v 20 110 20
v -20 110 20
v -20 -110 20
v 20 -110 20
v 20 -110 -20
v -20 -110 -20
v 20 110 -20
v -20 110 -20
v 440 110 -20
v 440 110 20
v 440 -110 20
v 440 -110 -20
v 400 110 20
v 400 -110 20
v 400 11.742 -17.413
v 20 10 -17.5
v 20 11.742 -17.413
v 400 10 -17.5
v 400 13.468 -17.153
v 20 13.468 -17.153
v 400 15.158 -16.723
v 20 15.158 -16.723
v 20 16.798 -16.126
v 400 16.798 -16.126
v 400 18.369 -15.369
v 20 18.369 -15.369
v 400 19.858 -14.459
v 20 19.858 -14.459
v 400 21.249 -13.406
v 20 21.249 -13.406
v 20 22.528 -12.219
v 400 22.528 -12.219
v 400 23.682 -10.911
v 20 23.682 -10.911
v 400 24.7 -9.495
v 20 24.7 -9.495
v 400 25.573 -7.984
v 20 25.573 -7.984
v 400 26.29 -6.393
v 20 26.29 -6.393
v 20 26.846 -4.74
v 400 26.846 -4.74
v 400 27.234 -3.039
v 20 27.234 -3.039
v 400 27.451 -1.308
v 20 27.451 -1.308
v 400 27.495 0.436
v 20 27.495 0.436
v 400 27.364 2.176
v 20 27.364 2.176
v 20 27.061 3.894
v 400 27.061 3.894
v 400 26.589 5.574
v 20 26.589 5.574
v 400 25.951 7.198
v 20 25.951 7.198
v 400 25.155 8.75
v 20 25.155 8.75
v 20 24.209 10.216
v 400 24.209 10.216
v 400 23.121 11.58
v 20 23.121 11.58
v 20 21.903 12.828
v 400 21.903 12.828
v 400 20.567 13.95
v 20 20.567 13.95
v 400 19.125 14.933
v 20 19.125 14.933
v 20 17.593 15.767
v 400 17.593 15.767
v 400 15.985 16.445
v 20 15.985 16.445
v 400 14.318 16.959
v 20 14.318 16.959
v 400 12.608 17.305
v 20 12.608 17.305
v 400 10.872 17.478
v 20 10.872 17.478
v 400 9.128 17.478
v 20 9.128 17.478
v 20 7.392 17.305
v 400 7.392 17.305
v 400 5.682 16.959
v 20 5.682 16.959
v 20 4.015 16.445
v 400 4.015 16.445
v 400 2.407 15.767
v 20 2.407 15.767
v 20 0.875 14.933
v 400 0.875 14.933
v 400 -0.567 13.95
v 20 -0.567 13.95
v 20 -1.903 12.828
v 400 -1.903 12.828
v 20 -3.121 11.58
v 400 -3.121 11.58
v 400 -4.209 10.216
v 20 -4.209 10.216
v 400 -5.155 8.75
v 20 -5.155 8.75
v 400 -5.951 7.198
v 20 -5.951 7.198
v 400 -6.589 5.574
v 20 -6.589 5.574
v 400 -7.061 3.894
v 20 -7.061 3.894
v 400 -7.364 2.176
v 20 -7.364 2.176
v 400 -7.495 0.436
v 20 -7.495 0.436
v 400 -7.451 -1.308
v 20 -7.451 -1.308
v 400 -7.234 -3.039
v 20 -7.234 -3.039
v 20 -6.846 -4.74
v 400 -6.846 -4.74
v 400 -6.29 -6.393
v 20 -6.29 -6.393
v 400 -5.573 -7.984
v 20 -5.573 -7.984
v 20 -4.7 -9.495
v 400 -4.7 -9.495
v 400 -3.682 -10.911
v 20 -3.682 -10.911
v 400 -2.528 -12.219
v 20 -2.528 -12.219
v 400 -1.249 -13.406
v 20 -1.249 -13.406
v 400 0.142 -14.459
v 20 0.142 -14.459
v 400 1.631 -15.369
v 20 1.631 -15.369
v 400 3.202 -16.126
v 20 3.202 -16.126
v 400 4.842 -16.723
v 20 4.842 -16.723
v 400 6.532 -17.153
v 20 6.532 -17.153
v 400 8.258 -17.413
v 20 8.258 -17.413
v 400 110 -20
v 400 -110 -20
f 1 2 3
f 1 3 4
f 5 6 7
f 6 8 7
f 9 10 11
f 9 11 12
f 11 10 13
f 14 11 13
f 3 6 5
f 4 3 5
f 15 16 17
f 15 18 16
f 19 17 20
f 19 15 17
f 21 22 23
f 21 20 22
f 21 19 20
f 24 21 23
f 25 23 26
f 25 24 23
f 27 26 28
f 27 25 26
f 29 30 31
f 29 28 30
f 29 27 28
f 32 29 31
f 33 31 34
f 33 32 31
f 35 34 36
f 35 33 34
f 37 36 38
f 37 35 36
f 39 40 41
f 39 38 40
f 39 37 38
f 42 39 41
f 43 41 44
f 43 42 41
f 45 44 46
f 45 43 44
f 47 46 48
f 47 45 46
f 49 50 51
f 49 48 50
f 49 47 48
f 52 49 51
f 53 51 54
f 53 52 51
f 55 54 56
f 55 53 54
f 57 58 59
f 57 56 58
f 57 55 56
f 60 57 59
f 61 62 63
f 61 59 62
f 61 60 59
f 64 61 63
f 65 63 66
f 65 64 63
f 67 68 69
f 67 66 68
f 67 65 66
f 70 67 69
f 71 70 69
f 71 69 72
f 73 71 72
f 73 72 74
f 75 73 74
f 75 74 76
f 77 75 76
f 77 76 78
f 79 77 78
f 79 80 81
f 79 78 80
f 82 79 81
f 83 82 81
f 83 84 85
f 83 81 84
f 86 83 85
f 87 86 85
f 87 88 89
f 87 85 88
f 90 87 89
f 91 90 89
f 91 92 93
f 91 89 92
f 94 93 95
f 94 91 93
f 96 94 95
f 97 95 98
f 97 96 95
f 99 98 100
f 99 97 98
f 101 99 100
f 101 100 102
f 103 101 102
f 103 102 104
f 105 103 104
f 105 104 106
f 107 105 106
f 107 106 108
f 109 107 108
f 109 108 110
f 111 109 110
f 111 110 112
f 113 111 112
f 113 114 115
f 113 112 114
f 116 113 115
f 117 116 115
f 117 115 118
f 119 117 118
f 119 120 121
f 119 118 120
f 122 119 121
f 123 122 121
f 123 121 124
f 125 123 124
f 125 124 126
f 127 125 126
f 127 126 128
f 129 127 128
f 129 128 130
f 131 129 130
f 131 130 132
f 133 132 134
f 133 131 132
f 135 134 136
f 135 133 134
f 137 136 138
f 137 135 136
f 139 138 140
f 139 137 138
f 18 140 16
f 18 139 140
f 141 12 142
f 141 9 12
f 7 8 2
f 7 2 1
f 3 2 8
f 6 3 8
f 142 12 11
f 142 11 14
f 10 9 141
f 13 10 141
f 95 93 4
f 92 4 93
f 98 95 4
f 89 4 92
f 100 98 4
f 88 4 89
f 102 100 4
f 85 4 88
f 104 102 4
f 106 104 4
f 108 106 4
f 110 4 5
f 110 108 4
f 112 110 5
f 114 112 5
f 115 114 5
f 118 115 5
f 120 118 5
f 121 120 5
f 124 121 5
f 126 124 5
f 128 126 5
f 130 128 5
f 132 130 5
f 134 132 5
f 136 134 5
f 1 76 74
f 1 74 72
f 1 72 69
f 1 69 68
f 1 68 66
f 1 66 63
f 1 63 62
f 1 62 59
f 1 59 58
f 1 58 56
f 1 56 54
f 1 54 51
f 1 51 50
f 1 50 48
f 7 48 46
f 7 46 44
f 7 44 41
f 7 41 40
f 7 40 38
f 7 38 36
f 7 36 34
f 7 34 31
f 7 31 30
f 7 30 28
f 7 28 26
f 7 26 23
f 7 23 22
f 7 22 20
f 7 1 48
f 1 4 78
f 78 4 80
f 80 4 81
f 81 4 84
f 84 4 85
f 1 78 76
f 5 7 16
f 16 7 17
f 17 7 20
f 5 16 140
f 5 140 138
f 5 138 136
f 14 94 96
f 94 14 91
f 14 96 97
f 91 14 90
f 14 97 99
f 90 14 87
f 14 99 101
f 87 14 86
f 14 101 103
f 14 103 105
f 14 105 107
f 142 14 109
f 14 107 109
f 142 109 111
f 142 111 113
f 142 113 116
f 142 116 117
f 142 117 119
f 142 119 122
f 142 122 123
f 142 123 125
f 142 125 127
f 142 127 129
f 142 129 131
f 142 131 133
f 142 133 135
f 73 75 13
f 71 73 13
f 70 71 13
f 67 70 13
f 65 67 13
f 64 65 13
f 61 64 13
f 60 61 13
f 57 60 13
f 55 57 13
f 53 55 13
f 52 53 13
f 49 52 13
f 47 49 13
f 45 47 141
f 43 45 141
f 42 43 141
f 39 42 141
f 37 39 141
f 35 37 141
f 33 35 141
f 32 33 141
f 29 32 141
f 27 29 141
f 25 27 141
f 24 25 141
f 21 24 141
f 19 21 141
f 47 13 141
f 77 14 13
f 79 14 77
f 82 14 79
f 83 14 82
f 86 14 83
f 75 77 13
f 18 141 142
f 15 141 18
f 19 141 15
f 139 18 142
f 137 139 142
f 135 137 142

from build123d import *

# Parameters (mm, degrees)
SKETCH1_W           = 40
SKETCH1_H           = 40
BOSS_EXTRUDE1_DEPTH = 110
SKETCH2_R           = 17.5
BOSS_EXTRUDE2_DEPTH = 210


with BuildPart() as part:
    # Sketch1 → Boss-Extrude1 (new body, symmetric)
    with BuildSketch(Plane(origin=(0, 0, 0), x_dir=(1, 0, 0), z_dir=(0, 1, 0))):
        Rectangle(SKETCH1_W, SKETCH1_H)
    extrude(amount=BOSS_EXTRUDE1_DEPTH, both=True)

    # Sketch2 → Boss-Extrude2 (add)
    with BuildSketch(Plane(origin=(0, 0, 0), x_dir=(0, 0, -1), z_dir=(1, 0, 0))):
        with Locations((0, 10)):
            Circle(SKETCH2_R)
    extrude(amount=BOSS_EXTRUDE2_DEPTH)

    # Mirror7: part across plane


with BuildPart() as part_1:
    add(part.part)
    add(part.part.mirror(Plane(origin=(210, 10, 0), x_dir=(0, 0, 1), z_dir=(1, 0, 0))))


solid = part_1.part
